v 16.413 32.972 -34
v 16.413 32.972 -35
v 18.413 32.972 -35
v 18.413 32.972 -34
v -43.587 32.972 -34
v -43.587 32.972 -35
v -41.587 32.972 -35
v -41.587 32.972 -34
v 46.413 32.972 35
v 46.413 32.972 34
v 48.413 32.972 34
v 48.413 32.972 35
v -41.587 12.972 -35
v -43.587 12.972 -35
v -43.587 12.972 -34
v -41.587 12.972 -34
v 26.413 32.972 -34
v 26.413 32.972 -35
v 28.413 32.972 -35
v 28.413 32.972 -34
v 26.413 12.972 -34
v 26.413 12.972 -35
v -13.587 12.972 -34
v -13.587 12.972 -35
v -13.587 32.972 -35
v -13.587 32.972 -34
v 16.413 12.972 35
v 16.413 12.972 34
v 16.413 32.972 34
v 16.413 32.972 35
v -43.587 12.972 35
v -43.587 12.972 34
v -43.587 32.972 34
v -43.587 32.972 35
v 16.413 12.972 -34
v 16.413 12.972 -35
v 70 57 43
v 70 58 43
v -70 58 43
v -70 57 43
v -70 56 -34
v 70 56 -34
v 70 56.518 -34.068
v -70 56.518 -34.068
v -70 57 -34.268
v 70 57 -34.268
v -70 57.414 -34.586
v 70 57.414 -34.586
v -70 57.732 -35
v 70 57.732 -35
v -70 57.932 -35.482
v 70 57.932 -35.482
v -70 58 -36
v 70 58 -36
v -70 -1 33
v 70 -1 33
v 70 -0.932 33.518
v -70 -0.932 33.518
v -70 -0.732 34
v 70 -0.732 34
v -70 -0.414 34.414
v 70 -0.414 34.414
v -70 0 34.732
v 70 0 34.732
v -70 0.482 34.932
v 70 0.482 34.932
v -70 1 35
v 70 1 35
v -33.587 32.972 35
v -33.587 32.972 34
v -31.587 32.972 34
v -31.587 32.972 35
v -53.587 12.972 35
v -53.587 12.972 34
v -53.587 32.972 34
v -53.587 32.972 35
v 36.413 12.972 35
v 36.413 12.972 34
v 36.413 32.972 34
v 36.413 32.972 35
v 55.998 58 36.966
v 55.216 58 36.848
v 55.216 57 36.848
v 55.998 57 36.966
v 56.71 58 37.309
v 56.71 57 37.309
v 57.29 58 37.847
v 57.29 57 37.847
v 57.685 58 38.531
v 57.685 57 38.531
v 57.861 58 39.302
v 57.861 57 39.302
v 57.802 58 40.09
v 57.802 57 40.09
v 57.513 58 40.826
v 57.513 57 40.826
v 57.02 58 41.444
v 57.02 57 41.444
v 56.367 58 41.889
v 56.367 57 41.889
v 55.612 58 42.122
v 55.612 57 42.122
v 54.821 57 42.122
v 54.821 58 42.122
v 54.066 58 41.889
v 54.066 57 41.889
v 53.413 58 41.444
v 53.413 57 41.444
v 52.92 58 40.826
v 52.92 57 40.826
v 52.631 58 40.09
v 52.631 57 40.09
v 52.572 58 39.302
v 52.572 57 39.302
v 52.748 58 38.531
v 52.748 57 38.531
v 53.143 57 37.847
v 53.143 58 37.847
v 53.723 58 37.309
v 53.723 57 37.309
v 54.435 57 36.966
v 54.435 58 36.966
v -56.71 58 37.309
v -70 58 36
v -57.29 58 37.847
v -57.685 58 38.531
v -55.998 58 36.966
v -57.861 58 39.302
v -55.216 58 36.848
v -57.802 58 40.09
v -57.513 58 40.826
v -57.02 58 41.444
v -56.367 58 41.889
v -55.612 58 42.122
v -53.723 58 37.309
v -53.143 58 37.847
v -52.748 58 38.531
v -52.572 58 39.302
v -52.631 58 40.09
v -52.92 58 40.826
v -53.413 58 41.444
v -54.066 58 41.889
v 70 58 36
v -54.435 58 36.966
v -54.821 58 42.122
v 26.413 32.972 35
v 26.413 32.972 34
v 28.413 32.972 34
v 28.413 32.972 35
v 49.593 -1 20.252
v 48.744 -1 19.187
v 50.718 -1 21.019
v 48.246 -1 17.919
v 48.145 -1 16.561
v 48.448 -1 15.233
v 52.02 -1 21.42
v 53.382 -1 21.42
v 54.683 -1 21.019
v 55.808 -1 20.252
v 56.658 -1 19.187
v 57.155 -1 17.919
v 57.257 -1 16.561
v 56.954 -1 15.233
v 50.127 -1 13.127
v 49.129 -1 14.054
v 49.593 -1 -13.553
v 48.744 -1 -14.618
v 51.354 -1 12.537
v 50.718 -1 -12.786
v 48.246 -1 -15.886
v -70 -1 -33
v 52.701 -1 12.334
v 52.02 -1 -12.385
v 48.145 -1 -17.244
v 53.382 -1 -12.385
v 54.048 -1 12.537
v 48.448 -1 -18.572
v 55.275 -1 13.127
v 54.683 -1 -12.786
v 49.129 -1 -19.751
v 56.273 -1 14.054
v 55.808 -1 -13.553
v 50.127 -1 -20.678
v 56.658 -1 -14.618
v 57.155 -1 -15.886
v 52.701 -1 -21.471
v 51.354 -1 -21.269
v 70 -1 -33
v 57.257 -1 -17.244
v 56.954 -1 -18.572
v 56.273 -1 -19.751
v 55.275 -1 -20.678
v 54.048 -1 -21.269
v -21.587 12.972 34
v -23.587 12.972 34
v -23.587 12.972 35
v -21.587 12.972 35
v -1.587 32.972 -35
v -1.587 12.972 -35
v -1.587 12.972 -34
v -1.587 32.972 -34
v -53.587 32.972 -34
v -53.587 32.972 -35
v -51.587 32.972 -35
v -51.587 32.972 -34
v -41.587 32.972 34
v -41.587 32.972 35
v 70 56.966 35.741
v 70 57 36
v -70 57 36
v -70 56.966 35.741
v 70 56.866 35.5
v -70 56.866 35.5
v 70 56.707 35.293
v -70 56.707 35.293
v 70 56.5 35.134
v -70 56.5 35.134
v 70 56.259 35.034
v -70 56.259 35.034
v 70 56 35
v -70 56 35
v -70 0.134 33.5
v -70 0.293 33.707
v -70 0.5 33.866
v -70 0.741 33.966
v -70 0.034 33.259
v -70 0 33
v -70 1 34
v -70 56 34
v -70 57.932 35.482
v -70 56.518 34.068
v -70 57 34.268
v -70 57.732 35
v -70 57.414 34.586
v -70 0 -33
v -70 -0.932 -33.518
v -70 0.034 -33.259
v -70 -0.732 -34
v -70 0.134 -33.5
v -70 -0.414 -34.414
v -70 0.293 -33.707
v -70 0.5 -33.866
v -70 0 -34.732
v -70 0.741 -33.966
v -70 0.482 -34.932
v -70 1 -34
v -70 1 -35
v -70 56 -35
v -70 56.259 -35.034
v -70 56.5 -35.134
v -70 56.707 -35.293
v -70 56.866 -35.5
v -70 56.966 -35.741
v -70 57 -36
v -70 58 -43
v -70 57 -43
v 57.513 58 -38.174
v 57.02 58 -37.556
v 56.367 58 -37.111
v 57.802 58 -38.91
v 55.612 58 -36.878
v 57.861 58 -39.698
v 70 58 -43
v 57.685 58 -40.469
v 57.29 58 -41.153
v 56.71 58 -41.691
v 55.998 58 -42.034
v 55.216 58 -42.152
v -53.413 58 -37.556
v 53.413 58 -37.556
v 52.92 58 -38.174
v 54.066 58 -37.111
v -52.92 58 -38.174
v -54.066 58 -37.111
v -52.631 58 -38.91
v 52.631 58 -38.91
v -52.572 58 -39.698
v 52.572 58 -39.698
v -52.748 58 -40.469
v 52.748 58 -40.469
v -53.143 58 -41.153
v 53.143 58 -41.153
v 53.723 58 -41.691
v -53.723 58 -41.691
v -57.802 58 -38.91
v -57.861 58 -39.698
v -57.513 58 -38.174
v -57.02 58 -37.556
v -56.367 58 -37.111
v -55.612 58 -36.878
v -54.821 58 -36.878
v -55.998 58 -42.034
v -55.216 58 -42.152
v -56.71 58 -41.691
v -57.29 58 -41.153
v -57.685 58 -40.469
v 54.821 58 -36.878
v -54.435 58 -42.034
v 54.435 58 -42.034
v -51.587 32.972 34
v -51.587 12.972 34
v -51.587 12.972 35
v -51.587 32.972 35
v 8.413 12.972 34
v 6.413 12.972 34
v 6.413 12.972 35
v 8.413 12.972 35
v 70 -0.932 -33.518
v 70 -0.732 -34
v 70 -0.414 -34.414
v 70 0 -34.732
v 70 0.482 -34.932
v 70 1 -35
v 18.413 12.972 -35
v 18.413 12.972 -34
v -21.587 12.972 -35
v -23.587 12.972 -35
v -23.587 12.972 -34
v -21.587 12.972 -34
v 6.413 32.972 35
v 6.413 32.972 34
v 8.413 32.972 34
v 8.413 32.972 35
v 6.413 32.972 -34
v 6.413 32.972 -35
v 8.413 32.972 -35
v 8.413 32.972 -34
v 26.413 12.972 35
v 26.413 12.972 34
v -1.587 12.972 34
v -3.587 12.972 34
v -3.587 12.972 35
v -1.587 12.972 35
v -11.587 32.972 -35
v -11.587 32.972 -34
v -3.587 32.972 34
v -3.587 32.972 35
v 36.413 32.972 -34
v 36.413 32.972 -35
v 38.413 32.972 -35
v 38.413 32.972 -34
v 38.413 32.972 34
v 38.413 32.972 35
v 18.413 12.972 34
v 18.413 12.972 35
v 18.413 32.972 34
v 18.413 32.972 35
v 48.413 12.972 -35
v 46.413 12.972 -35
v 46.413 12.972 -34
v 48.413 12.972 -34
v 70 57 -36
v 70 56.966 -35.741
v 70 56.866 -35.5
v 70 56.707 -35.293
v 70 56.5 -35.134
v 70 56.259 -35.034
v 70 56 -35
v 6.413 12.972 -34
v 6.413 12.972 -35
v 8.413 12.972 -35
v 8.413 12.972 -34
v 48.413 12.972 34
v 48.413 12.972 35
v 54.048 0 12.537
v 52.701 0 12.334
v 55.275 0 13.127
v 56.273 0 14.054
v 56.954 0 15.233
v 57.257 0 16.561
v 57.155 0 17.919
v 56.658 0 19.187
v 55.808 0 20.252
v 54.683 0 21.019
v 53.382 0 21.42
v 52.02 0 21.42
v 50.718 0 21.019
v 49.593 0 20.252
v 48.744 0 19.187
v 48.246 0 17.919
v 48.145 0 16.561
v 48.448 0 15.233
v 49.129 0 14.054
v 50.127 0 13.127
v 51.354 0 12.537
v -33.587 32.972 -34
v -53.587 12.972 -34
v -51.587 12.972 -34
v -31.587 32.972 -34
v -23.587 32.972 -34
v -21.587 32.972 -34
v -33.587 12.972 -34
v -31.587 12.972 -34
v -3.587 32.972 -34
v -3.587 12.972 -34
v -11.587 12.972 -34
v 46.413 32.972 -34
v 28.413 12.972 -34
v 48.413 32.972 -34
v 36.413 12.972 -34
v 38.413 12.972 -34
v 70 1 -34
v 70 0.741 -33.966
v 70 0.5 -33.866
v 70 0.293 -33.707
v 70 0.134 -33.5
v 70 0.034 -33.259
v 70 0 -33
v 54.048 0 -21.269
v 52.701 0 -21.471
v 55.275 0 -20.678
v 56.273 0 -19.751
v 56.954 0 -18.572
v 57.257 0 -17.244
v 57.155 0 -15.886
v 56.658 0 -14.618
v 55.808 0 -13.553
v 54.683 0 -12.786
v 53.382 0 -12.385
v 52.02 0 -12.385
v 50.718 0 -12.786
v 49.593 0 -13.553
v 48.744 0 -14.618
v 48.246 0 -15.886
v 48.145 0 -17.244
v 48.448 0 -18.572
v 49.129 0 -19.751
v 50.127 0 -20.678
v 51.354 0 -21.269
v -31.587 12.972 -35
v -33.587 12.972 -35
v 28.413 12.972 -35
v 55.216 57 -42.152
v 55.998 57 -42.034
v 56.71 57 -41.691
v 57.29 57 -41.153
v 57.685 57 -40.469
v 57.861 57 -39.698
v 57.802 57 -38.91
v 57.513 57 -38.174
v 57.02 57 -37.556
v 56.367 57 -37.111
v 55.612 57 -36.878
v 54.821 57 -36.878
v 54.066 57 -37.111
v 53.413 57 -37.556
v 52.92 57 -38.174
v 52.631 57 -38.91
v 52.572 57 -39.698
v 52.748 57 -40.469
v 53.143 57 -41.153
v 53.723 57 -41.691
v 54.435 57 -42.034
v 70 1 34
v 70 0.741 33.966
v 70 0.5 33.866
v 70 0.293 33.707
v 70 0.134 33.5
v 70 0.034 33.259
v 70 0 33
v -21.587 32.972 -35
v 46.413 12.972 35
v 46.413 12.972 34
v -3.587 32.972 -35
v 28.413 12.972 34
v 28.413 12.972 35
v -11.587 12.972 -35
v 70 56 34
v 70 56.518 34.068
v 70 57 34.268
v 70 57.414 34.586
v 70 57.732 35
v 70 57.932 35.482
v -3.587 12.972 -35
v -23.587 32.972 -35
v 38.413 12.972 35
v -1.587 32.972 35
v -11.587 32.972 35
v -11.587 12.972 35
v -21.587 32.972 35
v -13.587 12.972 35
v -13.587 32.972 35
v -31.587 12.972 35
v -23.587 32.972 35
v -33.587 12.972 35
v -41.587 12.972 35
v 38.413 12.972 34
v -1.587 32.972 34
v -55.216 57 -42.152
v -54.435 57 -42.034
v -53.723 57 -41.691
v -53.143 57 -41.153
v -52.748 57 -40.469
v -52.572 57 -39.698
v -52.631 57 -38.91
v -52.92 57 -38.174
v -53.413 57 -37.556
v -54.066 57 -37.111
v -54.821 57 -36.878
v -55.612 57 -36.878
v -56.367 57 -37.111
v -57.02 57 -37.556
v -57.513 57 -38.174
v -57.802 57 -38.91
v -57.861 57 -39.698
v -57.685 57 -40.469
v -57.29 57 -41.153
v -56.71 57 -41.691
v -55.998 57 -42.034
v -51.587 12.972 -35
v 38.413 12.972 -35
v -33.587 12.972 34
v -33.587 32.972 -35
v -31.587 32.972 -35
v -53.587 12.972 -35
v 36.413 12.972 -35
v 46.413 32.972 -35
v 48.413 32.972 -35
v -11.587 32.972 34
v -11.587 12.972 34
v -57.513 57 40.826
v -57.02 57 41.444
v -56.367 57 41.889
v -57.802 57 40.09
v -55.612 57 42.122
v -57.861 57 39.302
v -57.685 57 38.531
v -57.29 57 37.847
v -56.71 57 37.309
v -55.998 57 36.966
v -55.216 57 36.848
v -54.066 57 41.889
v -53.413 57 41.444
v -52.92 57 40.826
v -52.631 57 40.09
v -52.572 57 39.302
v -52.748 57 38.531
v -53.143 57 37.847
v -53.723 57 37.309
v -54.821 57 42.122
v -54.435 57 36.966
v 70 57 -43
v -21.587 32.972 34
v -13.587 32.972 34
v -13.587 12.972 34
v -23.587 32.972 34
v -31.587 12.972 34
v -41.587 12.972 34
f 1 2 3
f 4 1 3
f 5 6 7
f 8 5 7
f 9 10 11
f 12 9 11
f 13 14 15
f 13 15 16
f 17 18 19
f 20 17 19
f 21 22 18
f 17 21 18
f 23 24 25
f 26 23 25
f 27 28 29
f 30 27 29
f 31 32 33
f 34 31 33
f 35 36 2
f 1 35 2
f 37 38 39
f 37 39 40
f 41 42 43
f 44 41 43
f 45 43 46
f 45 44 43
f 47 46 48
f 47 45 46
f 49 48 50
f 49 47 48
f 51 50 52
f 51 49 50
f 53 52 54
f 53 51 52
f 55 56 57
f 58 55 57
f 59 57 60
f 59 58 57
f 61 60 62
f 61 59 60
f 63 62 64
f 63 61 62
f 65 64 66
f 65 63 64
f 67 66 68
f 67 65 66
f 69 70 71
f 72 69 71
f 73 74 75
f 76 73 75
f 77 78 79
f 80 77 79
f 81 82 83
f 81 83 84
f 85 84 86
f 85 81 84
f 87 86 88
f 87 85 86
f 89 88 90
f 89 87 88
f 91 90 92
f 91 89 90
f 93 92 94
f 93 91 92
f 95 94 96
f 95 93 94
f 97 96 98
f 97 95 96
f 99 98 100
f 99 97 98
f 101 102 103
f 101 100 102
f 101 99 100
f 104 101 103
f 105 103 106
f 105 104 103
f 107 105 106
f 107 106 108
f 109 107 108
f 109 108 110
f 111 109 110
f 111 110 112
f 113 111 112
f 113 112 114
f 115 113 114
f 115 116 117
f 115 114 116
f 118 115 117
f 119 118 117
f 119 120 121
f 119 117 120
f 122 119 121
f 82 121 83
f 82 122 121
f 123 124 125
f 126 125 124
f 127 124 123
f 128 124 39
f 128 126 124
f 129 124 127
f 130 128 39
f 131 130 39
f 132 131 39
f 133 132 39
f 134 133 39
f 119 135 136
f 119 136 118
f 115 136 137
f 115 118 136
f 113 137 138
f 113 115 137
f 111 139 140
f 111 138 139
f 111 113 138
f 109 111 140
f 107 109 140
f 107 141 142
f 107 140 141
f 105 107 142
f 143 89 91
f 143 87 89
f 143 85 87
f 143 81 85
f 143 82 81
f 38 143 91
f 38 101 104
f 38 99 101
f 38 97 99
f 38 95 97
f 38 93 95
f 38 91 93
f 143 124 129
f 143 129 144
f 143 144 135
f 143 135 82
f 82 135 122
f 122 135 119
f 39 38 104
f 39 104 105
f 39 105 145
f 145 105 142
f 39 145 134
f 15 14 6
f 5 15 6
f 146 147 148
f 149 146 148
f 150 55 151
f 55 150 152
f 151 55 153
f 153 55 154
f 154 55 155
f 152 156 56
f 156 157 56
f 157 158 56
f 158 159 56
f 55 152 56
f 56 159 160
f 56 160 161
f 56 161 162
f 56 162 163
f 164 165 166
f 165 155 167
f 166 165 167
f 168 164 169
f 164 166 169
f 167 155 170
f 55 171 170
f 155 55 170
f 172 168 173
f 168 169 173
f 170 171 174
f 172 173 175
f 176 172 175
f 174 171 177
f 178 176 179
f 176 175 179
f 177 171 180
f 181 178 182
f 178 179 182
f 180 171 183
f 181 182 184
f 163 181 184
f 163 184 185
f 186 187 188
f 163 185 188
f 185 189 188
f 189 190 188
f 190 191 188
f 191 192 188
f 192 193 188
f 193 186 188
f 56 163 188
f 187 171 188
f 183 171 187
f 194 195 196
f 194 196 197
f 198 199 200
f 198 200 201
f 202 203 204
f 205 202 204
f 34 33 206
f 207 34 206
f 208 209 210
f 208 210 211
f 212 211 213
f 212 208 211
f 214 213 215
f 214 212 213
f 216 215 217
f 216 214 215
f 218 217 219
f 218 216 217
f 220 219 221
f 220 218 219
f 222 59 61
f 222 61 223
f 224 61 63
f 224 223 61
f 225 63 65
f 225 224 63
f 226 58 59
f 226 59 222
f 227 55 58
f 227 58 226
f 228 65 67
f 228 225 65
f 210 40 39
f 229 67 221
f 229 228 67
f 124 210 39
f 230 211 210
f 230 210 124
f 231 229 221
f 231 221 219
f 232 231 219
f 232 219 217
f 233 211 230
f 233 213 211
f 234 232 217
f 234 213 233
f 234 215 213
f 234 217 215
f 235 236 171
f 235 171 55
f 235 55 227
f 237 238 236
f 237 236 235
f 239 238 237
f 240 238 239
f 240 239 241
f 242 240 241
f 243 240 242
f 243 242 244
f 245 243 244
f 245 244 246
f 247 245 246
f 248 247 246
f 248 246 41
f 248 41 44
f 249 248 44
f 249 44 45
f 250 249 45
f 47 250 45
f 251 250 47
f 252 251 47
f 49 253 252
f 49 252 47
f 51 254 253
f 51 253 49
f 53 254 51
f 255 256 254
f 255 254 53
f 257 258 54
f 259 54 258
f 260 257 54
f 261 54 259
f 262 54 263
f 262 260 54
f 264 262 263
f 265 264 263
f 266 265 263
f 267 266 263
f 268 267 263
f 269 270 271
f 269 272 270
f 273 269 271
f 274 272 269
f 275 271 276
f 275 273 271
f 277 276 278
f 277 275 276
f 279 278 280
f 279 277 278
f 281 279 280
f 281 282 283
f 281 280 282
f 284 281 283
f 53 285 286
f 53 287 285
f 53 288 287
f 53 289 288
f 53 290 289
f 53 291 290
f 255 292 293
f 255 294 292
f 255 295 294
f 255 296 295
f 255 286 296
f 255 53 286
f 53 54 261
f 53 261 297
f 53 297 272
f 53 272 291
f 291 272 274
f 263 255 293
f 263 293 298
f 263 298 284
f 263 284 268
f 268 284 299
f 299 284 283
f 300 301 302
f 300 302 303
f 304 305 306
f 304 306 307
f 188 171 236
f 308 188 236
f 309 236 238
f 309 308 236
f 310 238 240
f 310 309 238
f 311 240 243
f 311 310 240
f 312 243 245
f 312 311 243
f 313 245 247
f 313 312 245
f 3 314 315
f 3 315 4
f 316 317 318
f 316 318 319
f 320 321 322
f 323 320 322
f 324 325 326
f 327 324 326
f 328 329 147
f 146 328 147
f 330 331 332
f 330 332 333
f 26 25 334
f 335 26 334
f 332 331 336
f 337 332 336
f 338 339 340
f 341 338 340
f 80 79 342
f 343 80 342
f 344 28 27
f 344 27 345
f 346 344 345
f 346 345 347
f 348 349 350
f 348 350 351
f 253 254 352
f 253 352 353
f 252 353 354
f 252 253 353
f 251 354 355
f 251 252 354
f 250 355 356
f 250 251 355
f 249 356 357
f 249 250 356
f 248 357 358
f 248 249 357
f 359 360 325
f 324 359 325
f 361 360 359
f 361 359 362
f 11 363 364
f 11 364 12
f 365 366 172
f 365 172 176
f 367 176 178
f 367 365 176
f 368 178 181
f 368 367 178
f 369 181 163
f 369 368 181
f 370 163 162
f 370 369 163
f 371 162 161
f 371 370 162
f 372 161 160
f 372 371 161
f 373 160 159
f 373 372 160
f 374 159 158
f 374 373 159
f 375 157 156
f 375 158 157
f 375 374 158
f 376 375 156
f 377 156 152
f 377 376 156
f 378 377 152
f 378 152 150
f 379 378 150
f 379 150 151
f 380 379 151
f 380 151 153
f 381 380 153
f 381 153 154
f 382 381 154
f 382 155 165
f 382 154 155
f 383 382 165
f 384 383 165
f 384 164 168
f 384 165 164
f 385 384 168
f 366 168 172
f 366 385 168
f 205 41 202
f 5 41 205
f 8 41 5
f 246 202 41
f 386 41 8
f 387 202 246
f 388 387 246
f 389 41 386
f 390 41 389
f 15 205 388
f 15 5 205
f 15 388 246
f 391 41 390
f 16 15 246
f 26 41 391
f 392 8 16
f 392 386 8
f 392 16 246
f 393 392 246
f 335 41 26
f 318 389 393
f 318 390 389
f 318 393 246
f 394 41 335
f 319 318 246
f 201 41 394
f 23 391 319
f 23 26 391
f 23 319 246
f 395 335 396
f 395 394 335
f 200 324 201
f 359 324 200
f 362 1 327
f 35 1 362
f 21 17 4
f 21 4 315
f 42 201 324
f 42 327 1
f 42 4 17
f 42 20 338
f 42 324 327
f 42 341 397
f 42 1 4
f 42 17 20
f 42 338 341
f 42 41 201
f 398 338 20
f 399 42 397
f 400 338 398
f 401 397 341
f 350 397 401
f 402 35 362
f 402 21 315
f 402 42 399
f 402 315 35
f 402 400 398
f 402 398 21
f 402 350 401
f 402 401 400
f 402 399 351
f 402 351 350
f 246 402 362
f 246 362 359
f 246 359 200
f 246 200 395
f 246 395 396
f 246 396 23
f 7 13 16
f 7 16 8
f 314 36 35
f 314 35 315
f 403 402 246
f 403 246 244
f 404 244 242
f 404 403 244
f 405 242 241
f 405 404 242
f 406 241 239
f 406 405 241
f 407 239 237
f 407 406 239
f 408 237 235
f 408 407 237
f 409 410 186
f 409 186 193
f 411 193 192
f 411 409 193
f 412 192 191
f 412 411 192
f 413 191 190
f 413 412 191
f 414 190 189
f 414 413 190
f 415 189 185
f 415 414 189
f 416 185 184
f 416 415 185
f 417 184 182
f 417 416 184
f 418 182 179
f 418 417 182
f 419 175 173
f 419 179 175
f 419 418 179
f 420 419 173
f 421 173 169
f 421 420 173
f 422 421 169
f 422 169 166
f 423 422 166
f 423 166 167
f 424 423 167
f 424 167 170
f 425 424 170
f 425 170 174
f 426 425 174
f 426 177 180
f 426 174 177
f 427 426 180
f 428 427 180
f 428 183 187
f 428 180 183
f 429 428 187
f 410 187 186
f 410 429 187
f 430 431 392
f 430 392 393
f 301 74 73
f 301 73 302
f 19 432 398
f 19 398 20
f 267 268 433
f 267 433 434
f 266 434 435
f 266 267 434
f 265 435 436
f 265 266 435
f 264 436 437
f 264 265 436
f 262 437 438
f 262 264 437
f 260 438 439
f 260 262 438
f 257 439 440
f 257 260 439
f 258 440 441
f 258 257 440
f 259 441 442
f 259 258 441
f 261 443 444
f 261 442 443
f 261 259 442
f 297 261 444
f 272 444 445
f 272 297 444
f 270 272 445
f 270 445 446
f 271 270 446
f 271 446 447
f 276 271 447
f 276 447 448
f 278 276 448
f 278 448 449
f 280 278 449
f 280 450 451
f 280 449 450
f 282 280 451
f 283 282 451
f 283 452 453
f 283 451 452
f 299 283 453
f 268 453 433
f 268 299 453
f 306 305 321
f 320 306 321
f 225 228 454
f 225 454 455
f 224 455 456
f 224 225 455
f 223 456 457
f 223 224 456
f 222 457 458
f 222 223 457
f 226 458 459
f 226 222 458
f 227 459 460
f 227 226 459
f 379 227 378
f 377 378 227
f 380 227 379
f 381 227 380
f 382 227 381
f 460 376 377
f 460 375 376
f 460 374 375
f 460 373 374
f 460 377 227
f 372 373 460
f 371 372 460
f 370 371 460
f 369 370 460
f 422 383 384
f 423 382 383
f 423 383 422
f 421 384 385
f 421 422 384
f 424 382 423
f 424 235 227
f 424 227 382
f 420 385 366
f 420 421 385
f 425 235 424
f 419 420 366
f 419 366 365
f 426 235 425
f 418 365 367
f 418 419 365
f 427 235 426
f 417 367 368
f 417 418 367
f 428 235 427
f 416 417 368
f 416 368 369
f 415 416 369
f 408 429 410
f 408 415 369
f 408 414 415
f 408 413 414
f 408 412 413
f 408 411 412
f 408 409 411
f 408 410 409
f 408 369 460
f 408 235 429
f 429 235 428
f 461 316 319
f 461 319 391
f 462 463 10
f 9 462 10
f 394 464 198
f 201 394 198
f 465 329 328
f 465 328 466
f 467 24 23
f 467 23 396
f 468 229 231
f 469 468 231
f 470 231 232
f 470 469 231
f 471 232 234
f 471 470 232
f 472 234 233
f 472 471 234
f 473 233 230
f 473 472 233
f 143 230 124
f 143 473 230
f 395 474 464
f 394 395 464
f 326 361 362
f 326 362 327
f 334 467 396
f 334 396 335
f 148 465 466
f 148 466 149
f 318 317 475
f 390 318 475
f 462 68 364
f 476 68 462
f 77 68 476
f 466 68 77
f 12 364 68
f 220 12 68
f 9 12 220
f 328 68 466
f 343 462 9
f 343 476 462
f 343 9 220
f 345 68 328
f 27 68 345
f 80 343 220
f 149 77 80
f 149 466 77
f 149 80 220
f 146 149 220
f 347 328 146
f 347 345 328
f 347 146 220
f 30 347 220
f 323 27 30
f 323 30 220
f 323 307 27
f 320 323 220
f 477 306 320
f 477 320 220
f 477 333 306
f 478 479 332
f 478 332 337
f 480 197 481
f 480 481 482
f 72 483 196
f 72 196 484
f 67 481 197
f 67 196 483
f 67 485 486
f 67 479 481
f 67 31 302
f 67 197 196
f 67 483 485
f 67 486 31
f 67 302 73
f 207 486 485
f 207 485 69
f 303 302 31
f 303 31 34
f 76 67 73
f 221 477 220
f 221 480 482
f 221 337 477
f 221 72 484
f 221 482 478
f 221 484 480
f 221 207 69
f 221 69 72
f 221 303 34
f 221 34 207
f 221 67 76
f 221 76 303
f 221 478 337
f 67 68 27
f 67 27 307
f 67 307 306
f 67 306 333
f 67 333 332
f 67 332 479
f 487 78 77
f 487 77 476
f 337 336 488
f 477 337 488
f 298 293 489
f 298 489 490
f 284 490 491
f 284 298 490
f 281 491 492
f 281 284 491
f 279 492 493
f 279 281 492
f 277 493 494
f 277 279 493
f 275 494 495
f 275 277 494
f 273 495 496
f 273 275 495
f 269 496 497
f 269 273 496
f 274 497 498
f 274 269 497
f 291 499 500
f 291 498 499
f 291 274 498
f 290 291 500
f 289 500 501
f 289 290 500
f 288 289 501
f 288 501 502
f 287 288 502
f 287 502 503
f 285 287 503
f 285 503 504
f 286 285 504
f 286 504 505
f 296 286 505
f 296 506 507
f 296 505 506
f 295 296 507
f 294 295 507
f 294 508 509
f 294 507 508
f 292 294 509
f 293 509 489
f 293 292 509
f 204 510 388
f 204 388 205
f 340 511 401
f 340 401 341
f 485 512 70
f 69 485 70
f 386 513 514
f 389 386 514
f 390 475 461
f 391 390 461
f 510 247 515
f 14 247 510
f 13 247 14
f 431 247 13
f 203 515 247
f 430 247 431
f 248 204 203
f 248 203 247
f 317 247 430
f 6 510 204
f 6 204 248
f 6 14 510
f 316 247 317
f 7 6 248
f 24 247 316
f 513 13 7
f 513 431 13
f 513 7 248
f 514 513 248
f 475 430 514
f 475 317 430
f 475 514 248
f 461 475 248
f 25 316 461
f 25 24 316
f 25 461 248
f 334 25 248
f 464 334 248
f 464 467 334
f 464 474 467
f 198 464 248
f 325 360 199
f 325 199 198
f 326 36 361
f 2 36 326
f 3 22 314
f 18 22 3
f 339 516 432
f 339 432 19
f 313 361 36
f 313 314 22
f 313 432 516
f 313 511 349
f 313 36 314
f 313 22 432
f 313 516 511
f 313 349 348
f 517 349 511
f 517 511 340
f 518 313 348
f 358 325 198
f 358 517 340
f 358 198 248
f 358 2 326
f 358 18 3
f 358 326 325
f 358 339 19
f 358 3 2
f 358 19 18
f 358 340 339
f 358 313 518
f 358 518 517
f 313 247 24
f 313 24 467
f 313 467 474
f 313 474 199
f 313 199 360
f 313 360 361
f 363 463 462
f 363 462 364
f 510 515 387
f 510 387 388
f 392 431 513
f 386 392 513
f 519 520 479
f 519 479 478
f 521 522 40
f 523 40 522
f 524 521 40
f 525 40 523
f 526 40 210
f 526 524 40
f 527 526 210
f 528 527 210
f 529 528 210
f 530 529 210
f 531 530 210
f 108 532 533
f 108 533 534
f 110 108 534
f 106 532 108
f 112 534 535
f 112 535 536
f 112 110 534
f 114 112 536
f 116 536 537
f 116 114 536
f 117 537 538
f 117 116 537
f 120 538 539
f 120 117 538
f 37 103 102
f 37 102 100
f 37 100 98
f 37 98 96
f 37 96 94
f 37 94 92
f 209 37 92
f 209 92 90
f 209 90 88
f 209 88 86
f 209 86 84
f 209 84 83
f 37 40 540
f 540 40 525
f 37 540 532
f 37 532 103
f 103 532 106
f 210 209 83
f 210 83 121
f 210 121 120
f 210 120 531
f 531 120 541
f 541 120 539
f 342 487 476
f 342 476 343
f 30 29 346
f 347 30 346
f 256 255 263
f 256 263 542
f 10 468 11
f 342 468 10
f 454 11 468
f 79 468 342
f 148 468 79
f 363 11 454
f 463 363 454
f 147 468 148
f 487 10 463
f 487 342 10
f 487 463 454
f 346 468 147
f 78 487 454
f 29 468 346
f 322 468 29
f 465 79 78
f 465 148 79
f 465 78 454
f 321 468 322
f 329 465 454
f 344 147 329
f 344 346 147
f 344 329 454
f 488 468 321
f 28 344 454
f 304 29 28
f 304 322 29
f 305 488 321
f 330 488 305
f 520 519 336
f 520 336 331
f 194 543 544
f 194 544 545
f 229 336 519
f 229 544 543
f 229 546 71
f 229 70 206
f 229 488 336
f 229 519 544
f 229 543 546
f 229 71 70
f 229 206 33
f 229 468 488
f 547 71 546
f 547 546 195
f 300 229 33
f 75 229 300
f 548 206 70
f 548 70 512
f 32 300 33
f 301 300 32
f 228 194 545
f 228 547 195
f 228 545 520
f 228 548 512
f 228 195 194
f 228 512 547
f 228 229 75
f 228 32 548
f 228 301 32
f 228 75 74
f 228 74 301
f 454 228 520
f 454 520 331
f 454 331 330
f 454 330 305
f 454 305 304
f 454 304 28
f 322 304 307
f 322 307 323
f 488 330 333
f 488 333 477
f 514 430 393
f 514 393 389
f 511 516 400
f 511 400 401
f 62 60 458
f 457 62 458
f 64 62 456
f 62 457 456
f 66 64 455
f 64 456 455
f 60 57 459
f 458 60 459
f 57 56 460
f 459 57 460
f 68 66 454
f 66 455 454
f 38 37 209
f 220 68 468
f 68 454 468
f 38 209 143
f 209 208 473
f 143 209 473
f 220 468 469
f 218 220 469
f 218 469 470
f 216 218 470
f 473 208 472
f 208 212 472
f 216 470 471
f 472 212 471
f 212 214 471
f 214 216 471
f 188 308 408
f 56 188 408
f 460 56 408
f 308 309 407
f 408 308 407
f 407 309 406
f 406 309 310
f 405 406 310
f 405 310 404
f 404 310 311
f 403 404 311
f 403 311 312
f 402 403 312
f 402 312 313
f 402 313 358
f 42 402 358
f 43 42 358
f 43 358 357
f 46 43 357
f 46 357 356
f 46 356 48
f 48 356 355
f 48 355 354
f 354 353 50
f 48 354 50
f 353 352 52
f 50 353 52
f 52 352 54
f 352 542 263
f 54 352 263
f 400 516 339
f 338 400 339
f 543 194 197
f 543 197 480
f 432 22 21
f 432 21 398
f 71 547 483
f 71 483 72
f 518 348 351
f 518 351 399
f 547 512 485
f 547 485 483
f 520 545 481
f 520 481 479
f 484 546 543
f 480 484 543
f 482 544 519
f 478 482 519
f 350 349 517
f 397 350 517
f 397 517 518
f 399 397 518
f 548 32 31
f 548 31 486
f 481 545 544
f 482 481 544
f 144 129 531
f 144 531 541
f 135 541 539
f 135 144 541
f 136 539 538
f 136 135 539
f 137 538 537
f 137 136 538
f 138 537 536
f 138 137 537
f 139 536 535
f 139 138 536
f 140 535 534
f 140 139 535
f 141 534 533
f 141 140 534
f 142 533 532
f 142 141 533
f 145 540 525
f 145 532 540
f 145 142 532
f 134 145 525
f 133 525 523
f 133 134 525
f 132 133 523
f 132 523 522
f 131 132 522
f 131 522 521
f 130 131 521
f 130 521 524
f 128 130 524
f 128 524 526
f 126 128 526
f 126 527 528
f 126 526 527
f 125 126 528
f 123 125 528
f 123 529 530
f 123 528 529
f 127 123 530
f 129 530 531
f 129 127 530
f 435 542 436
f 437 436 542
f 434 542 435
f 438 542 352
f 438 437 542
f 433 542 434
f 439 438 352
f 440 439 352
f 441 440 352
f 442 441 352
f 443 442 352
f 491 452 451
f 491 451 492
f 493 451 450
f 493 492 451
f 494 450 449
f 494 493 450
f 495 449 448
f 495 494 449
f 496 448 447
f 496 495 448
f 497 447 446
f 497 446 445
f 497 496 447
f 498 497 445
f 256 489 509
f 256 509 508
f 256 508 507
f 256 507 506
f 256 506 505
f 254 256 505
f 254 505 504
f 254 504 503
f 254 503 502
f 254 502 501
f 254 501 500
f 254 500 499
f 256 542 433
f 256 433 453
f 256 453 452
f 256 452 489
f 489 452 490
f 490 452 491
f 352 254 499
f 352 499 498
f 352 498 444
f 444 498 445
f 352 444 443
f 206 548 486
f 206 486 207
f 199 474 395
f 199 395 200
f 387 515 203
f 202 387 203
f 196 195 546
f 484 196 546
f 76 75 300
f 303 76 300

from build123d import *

# Parameters (mm, degrees)
SKETCH1_W                      = 140
SKETCH1_H                      = 70
BASE_FLANGE1_DEPTH             = 1
EDGE_FLANGE1_STRIP_W           = 6
EDGE_FLANGE1_STRIP_H           = 1
EDGE_FLANGE1_STRIP_CUT_DEPTH   = 140
EDGE_FLANGE1_STRIP_2_W         = 6
EDGE_FLANGE1_STRIP_2_H         = 1
EDGE_FLANGE1_STRIP_CUT_2_DEPTH = 140
EDGE_FLANGE1_DEPTH             = 140
EDGE_FLANGE1_BEND_DEPTH        = 140
EDGE_FLANGE2_STRIP_W           = 6
EDGE_FLANGE2_STRIP_H           = 1
EDGE_FLANGE2_STRIP_CUT_DEPTH   = 140
EDGE_FLANGE2_DEPTH             = 140
EDGE_FLANGE3_STRIP_W           = 6
EDGE_FLANGE3_STRIP_H           = 1
EDGE_FLANGE3_STRIP_CUT_DEPTH   = 140
EDGE_FLANGE3_DEPTH             = 140
CUT_EXTRUDE1_DEPTH             = 120.783137378
CUT_EXTRUDE1_DEPTH_BACK        = 120.783137378
SKETCH18_W                     = 2
SKETCH18_H                     = 20
CUT_EXTRUDE2_DEPTH             = 101.56341283
CUT_EXTRUDE2_DEPTH_BACK        = 101.56341283
SKETCH20_R                     = 2.651793261
CUT_EXTRUDE3_DEPTH             = 102.143462468
CUT_EXTRUDE3_DEPTH_BACK        = 102.143462468
SKETCH21_R                     = 4.568960442


# Sheet-metal steps are written as plain solids
with BuildPart() as part:
    # Sketch1 → Base-Flange1 (new body)
    with BuildSketch(Plane(origin=(0, 0, 0), x_dir=(1, 0, 0), z_dir=(0, 1, 0))):
        Rectangle(SKETCH1_W, SKETCH1_H)
    extrude(amount=-BASE_FLANGE1_DEPTH)

    # Edge-Flange1 strip (across the edge) → Edge-Flange1 strip cut (cut)
    with BuildSketch(Plane(origin=(-70, 0, 35), x_dir=(0, 0, -1), z_dir=(1, 0, 0))):
        with Locations((-1, -0.5)):
            Rectangle(EDGE_FLANGE1_STRIP_W, EDGE_FLANGE1_STRIP_H)
    extrude(amount=EDGE_FLANGE1_STRIP_CUT_DEPTH, mode=Mode.SUBTRACT)

    # Edge-Flange1 strip 2 (across the edge) → Edge-Flange1 strip cut 2 (cut)
    with BuildSketch(Plane(origin=(70, 0, -35), x_dir=(0, 0, 1), z_dir=(-1, 0, 0))):
        with Locations((-1, -0.5)):
            Rectangle(EDGE_FLANGE1_STRIP_2_W, EDGE_FLANGE1_STRIP_2_H)
    extrude(amount=EDGE_FLANGE1_STRIP_CUT_2_DEPTH, mode=Mode.SUBTRACT)

    # Edge-Flange1 section (across the edge) → Edge-Flange1 (add)
    with BuildSketch(Plane(origin=(-70, 0, 35), x_dir=(0, 0, -1), z_dir=(1, 0, 0))):
        with BuildLine():
            Line((0, 1), (0, 58))
            Line((0, 58), (1, 58))
            Line((1, 58), (1, 1))
            ThreePointArc((1, 1), (1.292893219, 0.292893219), (2, 0))
            Line((2, 0), (2, -1))
            ThreePointArc((2, -1), (0.585786438, -0.414213562), (0, 1))
        make_face()
    extrude(amount=EDGE_FLANGE1_DEPTH)

    # Edge-Flange1 section 2 (across the edge) → Edge-Flange1 bend (add)
    with BuildSketch(Plane(origin=(70, 0, -35), x_dir=(0, 0, 1), z_dir=(-1, 0, 0))):
        with BuildLine():
            Line((0, 1), (0, 58))
            Line((0, 58), (1, 58))
            Line((1, 58), (1, 1))
            ThreePointArc((1, 1), (1.292893219, 0.292893219), (2, 0))
            Line((2, 0), (2, -1))
            ThreePointArc((2, -1), (0.585786438, -0.414213562), (0, 1))
        make_face()
    extrude(amount=EDGE_FLANGE1_BEND_DEPTH)

    # Edge-Flange2 strip (across the edge) → Edge-Flange2 strip cut (cut)
    with BuildSketch(Plane(origin=(70, 58, 35), x_dir=(0, -1, 0), z_dir=(-1, 0, 0))):
        with Locations((-1, -0.5)):
            Rectangle(EDGE_FLANGE2_STRIP_W, EDGE_FLANGE2_STRIP_H)
    extrude(amount=EDGE_FLANGE2_STRIP_CUT_DEPTH, mode=Mode.SUBTRACT)

    # Edge-Flange2 section (across the edge) → Edge-Flange2 (add)
    with BuildSketch(Plane(origin=(70, 58, 35), x_dir=(0, -1, 0), z_dir=(-1, 0, 0))):
        with BuildLine():
            Line((0, 1), (0, 8))
            Line((0, 8), (1, 8))
            Line((1, 8), (1, 1))
            ThreePointArc((1, 1), (1.292893219, 0.292893219), (2, 0))
            Line((2, 0), (2, -1))
            ThreePointArc((2, -1), (0.585786438, -0.414213562), (0, 1))
        make_face()
    extrude(amount=EDGE_FLANGE2_DEPTH)

    # Edge-Flange3 strip (across the edge) → Edge-Flange3 strip cut (cut)
    with BuildSketch(Plane(origin=(-70, 58, -35), x_dir=(0, -1, 0), z_dir=(1, 0, 0))):
        with Locations((-1, -0.5)):
            Rectangle(EDGE_FLANGE3_STRIP_W, EDGE_FLANGE3_STRIP_H)
    extrude(amount=EDGE_FLANGE3_STRIP_CUT_DEPTH, mode=Mode.SUBTRACT)

    # Edge-Flange3 section (across the edge) → Edge-Flange3 (add)
    with BuildSketch(Plane(origin=(-70, 58, -35), x_dir=(0, -1, 0), z_dir=(1, 0, 0))):
        with BuildLine():
            Line((0, 1), (0, 8))
            Line((0, 8), (1, 8))
            Line((1, 8), (1, 1))
            ThreePointArc((1, 1), (1.292893219, 0.292893219), (2, 0))
            Line((2, 0), (2, -1))
            ThreePointArc((2, -1), (0.585786438, -0.414213562), (0, 1))
        make_face()
    extrude(amount=EDGE_FLANGE3_DEPTH)

    # Sketch18 → Cut-Extrude1 (cut, two sides: drawn at the far end of the back side and taken through both)
    with BuildSketch(Plane.XY.offset(35).offset(-CUT_EXTRUDE1_DEPTH_BACK)):
        with Locations((-42.587057136, 22.971771136)):
            Rectangle(SKETCH18_W, SKETCH18_H)
        with Locations((-52.587057136, 22.971771136)):
            Rectangle(SKETCH18_W, SKETCH18_H)
        with Locations((-32.587057136, 22.971771136)):
            Rectangle(SKETCH18_W, SKETCH18_H)
        with Locations((-22.587057136, 22.971771136)):
            Rectangle(SKETCH18_W, SKETCH18_H)
        with Locations((-12.587057136, 22.971771136)):
            Rectangle(SKETCH18_W, SKETCH18_H)
        with Locations((-2.587057136, 22.971771136)):
            Rectangle(SKETCH18_W, SKETCH18_H)
        with Locations((7.412942864, 22.971771136)):
            Rectangle(SKETCH18_W, SKETCH18_H)
        with Locations((17.412942864, 22.971771136)):
            Rectangle(SKETCH18_W, SKETCH18_H)
        with Locations((27.412942864, 22.971771136)):
            Rectangle(SKETCH18_W, SKETCH18_H)
        with Locations((37.412942864, 22.971771136)):
            Rectangle(SKETCH18_W, SKETCH18_H)
        with Locations((47.412942864, 22.971771136)):
            Rectangle(SKETCH18_W, SKETCH18_H)
    extrude(amount=CUT_EXTRUDE1_DEPTH + CUT_EXTRUDE1_DEPTH_BACK, mode=Mode.SUBTRACT)

    # Sketch20 → Cut-Extrude2 (cut, two sides: drawn at the far end of the back side and taken through both)
    with BuildSketch(Plane.XZ.offset(-57).offset(-CUT_EXTRUDE2_DEPTH_BACK)):
        with Locations(Location((-55.216327322, 39.5, 0), (0, 0, 270))):
            Circle(SKETCH20_R)
        with Locations(Location((-55.216327322, -39.5, 0), (0, 0, 270))):
            Circle(SKETCH20_R)
        with Locations(Location((55.216327322, -39.5, 0), (0, 0, 270))):
            Circle(SKETCH20_R)
        with Locations(Location((55.216327322, 39.5, 0), (0, 0, 270))):
            Circle(SKETCH20_R)
    extrude(amount=CUT_EXTRUDE2_DEPTH + CUT_EXTRUDE2_DEPTH_BACK, mode=Mode.SUBTRACT)

    # Sketch21 → Cut-Extrude3 (cut, two sides: drawn at the far end of the back side and taken through both)
    with BuildSketch(Plane.XZ.offset(1).offset(-CUT_EXTRUDE3_DEPTH_BACK)):
        with Locations(Location((52.700809146, 16.902528803, 0), (0, 0, 270))):
            Circle(SKETCH21_R)
        with Locations(Location((52.700809146, -16.902528803, 0), (0, 0, 270))):
            Circle(SKETCH21_R)
    extrude(amount=CUT_EXTRUDE3_DEPTH + CUT_EXTRUDE3_DEPTH_BACK, mode=Mode.SUBTRACT)


solid = part.part
